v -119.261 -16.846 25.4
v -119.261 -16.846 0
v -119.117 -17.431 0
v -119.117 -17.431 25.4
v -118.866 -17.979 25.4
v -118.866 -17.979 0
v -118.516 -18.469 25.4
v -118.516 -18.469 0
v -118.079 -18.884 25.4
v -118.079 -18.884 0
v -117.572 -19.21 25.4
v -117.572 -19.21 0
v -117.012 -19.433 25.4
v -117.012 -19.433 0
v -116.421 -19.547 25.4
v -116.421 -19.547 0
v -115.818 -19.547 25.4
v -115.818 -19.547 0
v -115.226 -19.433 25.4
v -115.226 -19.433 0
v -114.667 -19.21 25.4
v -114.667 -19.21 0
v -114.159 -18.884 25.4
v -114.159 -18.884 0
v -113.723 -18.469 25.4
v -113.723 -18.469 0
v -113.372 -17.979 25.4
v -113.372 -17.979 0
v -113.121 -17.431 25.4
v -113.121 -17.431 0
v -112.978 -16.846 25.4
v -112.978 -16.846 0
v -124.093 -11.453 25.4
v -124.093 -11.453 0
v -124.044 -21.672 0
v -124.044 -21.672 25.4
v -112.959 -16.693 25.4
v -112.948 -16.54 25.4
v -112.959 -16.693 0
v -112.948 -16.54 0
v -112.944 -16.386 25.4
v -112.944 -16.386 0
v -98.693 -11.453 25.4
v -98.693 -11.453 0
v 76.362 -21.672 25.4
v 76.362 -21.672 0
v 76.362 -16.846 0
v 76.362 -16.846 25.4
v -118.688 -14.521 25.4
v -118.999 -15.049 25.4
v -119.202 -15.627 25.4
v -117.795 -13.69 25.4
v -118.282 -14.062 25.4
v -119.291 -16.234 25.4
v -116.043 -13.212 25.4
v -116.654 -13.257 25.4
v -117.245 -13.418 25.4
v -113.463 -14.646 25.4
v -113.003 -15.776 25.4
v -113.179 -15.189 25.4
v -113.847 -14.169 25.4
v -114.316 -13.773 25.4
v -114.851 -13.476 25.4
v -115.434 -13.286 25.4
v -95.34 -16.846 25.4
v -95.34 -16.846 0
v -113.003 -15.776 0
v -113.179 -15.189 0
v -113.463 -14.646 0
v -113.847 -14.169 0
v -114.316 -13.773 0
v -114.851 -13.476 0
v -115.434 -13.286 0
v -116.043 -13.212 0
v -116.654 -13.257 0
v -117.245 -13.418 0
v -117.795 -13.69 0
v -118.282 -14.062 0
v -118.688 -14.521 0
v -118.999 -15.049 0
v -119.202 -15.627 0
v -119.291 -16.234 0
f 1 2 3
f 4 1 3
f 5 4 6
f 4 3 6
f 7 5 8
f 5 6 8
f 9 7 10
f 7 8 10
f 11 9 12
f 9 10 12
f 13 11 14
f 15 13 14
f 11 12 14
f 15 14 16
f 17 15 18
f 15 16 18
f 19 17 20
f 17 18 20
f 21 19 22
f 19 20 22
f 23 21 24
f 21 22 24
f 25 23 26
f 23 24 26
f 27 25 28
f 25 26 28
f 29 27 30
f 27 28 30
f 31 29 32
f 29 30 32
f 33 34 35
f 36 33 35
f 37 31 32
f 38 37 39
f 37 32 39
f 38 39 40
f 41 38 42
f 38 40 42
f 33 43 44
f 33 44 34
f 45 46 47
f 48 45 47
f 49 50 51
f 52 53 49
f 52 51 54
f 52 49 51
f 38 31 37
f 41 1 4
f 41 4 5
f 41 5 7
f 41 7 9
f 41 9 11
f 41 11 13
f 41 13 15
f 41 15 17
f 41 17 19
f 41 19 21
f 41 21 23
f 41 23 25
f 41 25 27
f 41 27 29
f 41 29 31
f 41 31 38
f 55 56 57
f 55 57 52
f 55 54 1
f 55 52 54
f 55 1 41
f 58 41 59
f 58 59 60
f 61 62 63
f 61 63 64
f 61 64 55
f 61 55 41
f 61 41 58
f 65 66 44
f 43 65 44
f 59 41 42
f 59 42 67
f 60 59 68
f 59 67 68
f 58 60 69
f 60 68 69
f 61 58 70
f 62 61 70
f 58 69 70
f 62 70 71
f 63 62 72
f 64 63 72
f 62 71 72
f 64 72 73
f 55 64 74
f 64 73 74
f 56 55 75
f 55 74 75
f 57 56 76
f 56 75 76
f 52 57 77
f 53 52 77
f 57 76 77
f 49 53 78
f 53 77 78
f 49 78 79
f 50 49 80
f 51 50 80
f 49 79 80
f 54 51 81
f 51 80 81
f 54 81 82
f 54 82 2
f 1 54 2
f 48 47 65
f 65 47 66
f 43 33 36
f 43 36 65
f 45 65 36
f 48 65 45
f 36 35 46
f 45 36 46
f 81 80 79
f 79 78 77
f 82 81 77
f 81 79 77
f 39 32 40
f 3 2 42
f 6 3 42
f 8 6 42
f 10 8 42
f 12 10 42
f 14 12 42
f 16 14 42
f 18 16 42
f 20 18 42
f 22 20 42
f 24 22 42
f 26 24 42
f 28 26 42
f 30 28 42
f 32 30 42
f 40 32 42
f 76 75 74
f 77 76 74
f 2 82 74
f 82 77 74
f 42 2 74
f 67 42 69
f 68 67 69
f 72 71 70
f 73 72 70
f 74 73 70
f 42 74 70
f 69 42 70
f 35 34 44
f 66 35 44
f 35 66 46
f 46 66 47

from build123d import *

# Parameters (mm, degrees)
F2_DEPTH = 25.4


with BuildPart() as f2:
    # F0 (on Top) → F2 (new body)
    with BuildSketch(Plane.XY):
        Polygon((-124.0930631757, -11.4529291168), (-124.0440234542, -21.6724649072), (76.3619765458, -21.6724649072), (76.3619765458, -16.8457691168), (45.5234815489, -16.8457691168), (34.1813331581, -16.8457691168), (22.8391847673, -16.8457691168), (11.4970363766, -16.8457691168), (0.1548879858, -16.8457691168), (-11.187260405, -16.8457691168), (-22.5294087958, -16.8457691168), (-33.8715571866, -16.8457691168), (-45.2137055773, -16.8457691168), (-56.5558539681, -16.8457691168), (-67.8980023589, -16.8457691168), (-79.2401507497, -16.8457691168), (-95.3404855502, -16.8457691168), (-98.6930631757, -11.4529291168), align=None)
    extrude(amount=F2_DEPTH)


with BuildPart() as f2b:
    # F1 (on face) → F2, piece 2 (new body)
    with BuildSketch(Plane.XY):
        with BuildLine():
            Line((-112.9776063571, -16.8457691168), (-119.2608204474, -16.8457691168))
            ThreePointArc((-119.2608204474, -16.8457691168), (-116.1192134023, -19.5614977658), (-112.9776063571, -16.8457691168))
        make_face()
        with BuildLine():
            ThreePointArc((-112.9776063571, -16.8457691168), (-112.9525726452, -16.6167396295), (-112.9442134023, -16.3864977658))
            ThreePointArc((-112.9442134023, -16.3864977658), (-116.349455266, -13.2198570087), (-119.2608204474, -16.8457691168))
            Line((-119.2608204474, -16.8457691168), (-112.9776063571, -16.8457691168))
        make_face()
    extrude(amount=F2_DEPTH)


solid = Compound([f2.part, f2b.part])
